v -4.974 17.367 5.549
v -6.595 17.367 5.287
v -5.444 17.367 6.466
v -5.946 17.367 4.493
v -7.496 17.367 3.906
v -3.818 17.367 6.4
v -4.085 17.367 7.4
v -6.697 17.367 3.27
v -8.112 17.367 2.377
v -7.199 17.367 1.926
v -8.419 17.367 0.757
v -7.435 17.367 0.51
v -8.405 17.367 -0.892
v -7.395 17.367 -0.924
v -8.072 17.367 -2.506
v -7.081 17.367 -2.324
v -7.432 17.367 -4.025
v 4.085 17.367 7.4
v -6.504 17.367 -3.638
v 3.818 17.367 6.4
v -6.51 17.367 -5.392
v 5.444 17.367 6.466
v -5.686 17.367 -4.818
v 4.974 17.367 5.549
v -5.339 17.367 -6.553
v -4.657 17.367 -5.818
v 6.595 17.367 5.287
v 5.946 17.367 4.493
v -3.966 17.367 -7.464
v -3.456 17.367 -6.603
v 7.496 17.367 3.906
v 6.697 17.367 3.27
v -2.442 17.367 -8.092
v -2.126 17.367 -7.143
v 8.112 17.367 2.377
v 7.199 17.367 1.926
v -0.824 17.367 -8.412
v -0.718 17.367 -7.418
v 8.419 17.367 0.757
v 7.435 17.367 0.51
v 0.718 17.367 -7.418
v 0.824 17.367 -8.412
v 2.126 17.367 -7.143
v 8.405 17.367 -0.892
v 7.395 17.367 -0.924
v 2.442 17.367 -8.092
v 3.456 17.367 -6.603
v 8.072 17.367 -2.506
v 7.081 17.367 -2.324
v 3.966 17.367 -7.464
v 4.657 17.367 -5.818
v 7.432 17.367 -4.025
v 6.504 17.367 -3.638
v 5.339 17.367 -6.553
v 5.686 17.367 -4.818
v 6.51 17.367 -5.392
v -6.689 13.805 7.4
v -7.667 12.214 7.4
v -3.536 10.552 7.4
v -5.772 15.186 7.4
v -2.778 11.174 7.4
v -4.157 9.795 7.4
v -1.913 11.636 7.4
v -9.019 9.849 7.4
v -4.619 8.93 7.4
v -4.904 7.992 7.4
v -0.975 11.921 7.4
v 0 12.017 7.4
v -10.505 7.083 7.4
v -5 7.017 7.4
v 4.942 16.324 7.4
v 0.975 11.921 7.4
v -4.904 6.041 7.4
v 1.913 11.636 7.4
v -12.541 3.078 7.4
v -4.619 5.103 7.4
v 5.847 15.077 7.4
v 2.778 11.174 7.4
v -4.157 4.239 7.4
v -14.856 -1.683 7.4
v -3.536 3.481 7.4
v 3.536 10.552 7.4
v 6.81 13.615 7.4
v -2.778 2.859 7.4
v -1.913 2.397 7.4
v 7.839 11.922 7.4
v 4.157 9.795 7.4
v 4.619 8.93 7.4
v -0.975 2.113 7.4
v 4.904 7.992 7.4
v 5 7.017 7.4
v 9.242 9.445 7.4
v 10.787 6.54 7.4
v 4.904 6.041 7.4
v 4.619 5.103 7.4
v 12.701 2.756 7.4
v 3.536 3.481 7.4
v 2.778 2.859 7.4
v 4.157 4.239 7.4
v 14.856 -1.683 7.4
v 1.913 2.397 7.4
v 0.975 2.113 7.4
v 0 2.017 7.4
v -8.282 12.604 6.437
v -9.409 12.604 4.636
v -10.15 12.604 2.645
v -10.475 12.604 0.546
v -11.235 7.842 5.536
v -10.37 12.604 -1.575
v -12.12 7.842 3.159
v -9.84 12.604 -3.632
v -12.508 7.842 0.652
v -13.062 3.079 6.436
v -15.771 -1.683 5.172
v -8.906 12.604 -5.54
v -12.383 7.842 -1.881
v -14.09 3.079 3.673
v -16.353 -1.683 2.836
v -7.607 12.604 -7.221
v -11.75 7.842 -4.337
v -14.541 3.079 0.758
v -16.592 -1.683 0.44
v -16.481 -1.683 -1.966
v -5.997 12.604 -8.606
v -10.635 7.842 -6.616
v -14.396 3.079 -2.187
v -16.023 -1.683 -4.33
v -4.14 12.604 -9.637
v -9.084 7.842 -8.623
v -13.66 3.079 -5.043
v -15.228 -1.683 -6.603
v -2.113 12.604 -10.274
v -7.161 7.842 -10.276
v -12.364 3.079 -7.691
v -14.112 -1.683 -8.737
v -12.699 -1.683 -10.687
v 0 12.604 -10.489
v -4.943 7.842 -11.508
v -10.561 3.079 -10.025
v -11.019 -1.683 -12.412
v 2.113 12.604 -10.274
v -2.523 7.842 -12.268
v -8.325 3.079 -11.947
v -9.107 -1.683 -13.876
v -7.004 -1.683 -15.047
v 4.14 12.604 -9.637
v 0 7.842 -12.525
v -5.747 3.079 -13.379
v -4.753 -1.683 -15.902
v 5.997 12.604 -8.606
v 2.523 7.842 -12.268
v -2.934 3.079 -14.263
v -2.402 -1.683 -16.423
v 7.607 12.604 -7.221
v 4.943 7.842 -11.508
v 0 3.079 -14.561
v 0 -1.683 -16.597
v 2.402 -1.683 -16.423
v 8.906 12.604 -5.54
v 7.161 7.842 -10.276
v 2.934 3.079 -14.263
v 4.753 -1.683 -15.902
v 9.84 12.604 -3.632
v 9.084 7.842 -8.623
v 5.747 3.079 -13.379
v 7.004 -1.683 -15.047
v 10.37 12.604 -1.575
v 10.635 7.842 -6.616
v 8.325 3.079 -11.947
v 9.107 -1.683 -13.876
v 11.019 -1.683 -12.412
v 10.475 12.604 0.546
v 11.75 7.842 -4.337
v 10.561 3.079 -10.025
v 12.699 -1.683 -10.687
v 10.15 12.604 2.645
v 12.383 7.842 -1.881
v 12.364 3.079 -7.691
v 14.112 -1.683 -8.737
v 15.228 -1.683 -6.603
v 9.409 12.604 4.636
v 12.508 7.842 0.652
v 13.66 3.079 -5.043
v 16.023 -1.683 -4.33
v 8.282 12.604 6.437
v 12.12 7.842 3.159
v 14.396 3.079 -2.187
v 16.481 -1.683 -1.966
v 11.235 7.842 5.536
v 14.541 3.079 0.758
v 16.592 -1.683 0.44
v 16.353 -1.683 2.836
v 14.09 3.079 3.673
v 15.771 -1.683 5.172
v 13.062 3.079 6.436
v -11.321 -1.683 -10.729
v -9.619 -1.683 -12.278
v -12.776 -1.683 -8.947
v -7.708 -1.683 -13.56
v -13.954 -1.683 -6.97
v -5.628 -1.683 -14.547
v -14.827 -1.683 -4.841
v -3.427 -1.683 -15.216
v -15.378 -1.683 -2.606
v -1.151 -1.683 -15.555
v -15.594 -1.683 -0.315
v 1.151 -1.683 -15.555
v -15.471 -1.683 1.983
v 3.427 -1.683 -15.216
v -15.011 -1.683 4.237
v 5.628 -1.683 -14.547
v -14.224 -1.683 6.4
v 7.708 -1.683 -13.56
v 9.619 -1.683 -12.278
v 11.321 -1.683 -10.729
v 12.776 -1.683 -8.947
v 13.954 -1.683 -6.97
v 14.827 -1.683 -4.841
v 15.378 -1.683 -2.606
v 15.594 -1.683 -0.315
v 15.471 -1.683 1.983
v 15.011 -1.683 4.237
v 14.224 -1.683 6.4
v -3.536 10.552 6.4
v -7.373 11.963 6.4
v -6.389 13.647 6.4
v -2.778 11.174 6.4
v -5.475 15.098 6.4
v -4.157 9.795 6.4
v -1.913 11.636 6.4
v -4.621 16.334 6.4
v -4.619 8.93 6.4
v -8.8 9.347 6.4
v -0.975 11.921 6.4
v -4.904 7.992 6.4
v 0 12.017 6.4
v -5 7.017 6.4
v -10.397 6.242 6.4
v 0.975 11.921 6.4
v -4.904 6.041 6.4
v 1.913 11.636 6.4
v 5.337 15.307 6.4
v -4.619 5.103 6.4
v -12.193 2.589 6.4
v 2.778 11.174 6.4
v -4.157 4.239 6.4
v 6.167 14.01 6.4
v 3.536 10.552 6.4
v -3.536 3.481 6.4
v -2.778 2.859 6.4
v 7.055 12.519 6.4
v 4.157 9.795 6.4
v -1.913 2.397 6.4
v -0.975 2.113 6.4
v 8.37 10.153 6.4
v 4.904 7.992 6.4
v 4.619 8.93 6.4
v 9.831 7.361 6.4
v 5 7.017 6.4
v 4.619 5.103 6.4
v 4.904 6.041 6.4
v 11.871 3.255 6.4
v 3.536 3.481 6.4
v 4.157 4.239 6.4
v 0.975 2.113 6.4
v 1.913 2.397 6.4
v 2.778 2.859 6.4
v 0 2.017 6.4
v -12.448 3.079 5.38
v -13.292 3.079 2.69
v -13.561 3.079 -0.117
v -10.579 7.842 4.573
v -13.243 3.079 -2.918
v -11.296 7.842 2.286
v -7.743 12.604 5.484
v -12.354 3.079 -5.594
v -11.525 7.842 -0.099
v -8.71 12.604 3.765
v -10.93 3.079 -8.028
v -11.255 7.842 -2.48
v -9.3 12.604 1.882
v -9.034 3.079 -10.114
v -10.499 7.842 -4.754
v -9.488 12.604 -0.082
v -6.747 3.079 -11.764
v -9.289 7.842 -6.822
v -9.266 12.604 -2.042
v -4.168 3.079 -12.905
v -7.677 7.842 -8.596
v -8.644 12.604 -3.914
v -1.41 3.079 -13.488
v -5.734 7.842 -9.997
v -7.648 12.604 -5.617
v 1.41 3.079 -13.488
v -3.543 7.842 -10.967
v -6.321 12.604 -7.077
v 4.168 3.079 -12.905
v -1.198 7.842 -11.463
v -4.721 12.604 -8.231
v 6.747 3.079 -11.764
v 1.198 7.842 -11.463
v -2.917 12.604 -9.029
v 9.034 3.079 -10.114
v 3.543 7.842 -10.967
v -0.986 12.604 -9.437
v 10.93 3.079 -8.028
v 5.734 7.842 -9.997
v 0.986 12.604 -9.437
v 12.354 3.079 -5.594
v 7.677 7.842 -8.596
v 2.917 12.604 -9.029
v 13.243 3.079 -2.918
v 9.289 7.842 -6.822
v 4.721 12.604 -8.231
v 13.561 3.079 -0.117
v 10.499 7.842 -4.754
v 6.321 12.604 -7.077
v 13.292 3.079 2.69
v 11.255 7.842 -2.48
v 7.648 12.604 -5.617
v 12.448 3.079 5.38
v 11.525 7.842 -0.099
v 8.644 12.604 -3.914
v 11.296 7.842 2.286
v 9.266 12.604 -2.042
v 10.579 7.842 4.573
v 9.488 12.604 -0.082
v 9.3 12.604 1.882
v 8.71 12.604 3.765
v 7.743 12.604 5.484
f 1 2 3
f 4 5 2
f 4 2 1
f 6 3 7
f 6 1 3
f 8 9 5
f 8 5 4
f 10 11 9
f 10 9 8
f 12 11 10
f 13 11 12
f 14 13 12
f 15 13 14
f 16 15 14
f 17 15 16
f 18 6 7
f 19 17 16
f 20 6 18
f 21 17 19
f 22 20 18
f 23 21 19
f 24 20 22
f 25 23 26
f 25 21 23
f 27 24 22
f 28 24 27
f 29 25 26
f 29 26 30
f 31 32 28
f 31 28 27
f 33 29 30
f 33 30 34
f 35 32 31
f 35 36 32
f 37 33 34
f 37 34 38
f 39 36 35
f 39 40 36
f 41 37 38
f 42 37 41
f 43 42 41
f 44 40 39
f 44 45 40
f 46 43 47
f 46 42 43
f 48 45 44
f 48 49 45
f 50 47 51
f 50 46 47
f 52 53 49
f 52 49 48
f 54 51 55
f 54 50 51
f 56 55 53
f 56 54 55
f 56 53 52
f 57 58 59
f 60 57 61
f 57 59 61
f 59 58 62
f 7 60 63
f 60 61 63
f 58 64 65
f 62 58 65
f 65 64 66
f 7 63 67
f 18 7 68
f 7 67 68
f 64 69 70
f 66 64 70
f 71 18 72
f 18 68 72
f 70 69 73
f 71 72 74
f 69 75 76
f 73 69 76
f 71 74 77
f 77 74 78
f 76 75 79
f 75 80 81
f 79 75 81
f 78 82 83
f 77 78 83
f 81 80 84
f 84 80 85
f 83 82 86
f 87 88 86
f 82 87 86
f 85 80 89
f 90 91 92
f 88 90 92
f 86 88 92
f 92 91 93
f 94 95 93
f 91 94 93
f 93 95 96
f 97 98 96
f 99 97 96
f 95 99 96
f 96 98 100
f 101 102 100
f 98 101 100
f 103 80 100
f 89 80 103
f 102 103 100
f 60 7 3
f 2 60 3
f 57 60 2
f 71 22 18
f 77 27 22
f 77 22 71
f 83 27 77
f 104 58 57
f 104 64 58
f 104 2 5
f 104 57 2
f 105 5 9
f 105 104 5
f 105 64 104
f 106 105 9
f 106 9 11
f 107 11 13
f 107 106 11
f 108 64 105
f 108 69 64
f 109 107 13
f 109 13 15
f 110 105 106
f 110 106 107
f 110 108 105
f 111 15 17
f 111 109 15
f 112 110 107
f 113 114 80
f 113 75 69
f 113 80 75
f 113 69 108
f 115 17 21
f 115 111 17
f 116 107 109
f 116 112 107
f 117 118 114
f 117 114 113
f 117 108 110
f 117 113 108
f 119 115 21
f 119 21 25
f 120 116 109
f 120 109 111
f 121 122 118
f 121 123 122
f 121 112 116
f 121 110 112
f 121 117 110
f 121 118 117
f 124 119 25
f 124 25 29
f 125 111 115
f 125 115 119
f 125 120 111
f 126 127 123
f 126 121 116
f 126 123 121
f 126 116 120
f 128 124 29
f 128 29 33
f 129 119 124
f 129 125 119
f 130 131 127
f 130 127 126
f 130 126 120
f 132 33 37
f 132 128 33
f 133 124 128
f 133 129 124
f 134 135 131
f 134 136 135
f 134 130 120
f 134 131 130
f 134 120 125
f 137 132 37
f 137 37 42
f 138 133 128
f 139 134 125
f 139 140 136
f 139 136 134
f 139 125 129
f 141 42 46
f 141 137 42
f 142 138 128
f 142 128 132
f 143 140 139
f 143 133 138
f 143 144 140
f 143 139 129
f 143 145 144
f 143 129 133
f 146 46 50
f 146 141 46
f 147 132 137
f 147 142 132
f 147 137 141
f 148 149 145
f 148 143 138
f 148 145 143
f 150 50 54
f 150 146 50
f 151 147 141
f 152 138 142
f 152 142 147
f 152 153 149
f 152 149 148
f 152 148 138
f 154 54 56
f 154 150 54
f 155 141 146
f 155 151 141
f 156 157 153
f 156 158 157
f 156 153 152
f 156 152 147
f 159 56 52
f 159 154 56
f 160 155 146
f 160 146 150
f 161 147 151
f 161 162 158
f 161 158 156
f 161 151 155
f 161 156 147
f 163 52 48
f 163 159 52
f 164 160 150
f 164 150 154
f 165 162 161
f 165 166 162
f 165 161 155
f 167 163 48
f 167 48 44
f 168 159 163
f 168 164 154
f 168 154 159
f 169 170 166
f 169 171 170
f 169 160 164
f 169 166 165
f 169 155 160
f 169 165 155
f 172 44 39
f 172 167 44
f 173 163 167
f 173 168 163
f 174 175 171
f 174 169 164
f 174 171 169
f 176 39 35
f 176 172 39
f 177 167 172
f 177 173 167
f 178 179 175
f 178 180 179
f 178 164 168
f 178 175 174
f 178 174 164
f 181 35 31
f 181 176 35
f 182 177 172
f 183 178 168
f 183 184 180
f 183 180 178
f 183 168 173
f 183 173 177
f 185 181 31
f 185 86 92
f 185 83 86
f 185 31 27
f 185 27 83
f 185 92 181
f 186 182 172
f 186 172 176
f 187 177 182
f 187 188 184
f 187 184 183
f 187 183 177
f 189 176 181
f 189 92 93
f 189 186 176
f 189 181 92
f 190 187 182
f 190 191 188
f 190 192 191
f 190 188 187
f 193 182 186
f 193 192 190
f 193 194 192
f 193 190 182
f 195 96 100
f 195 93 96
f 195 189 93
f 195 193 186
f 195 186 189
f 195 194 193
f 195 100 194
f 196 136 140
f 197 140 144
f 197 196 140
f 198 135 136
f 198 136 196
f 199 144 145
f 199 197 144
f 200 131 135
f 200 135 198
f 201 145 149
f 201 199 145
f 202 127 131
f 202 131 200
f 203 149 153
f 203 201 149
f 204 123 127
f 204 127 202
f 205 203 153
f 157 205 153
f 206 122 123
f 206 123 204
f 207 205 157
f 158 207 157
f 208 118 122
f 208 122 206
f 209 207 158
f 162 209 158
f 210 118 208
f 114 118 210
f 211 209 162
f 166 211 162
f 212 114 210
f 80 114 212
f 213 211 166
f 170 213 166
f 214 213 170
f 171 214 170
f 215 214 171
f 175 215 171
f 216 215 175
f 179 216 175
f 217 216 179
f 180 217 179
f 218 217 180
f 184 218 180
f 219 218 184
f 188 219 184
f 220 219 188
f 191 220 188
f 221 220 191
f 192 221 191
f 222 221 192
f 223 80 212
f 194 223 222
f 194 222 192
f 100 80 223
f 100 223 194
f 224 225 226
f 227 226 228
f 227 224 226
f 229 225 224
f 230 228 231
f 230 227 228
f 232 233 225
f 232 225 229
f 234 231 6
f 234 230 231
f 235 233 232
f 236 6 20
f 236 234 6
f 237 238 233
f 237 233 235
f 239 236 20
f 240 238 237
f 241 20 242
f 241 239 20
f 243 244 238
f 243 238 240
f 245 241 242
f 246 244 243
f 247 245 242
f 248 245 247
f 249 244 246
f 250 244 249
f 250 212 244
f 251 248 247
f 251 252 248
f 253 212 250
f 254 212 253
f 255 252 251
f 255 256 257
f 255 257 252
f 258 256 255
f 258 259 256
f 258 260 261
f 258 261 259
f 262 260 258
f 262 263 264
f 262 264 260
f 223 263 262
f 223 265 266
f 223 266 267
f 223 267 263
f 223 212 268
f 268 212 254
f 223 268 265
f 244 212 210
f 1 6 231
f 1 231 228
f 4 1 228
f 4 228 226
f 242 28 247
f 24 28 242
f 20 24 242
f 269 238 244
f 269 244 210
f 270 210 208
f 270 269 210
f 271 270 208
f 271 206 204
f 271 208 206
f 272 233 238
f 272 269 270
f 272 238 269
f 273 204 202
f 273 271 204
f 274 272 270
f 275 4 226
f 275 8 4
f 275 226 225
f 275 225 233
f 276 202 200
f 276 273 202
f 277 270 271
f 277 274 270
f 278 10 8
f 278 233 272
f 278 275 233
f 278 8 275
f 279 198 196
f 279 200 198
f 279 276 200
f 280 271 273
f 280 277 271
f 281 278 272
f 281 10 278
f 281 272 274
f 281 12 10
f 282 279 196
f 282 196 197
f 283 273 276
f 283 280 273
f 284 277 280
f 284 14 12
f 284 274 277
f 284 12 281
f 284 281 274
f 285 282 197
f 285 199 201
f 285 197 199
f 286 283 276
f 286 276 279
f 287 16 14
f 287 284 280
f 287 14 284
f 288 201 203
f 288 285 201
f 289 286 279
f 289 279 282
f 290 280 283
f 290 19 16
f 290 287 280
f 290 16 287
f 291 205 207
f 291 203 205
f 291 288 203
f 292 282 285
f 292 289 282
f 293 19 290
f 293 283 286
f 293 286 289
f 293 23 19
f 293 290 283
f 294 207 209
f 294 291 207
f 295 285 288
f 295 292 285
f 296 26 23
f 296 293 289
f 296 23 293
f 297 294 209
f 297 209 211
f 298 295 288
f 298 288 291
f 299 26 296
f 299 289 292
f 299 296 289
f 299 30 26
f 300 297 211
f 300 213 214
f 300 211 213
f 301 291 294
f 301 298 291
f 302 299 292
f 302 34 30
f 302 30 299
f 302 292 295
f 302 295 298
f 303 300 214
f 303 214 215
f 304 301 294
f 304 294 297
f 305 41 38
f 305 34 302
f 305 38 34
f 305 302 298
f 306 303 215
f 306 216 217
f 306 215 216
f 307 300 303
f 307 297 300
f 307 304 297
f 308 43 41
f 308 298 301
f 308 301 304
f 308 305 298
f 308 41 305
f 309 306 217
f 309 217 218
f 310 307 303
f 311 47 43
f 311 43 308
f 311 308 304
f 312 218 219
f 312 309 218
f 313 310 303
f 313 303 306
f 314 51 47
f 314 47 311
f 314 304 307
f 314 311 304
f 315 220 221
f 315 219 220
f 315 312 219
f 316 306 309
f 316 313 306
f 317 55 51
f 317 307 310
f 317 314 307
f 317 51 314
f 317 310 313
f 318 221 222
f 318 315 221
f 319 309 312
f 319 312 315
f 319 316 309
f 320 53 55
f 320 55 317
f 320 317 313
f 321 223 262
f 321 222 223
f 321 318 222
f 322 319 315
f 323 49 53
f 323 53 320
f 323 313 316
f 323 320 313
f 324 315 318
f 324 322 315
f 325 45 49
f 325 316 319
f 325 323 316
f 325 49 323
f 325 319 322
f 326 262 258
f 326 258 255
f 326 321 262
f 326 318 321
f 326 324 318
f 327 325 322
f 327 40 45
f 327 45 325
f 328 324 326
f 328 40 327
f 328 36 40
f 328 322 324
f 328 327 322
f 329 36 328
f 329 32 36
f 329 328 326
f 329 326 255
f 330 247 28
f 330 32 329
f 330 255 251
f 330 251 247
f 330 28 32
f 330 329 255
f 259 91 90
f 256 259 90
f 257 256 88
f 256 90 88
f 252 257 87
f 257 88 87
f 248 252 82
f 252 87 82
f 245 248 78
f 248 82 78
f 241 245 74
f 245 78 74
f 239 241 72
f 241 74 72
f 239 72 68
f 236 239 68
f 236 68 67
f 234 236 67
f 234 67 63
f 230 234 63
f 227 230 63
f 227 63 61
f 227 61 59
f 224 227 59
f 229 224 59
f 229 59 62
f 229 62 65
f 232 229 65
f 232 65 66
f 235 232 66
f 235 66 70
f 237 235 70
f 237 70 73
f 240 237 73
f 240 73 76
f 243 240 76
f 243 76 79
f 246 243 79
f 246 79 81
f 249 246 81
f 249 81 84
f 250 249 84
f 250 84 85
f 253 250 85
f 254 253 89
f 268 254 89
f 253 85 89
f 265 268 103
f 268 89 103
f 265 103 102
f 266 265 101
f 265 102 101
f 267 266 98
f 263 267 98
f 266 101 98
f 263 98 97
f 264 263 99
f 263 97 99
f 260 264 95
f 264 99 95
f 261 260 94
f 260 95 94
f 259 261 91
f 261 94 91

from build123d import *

# Parameters (mm, degrees)
CUT_EXTRUDE1_DEPTH      = 32.981303132
CUT_EXTRUDE1_DEPTH_BACK = 32.981303132
SKETCH4_W               = 44.770884432
SKETCH4_H               = 10.69042287
SKETCH6_W               = 30.665330586
SKETCH6_H               = 1
BOSS_EXTRUDE1_DEPTH     = 21.05
SKETCH8_W               = 44.013591964
SKETCH8_H               = 26.255140404
CUT_EXTRUDE2_DEPTH      = 1
SKETCH9_W               = 50.816359418
SKETCH9_H               = 30.548951937
CUT_EXTRUDE3_DEPTH      = 1
CUT_EXTRUDE4_REACH      = 35.955
SKETCH10_R              = 5


with BuildPart() as part:
    # Sketch3 → Revolve1 (revolve)
    with BuildSketch(Plane.XY):
        Polygon((-7.025, 18.366712654), (-8.025, 18.366712654), (-17.025, -2.683287346), (-16.025, -2.683287346), align=None)
    revolve(axis=Axis((0, 50, 0), (0, -1, 0)))

    # Sketch4 → Cut-Extrude1 (cut, two sides: drawn at the far end of the back side and taken through both)
    with BuildSketch(Plane(origin=(0, 18.366712654, 0), x_dir=(1, 0, 0), z_dir=(0, 1, 0)).offset(-CUT_EXTRUDE1_DEPTH_BACK)):
        with Locations((0.720276718, -12.745211435)):
            Rectangle(SKETCH4_W, SKETCH4_H)
    extrude(amount=CUT_EXTRUDE1_DEPTH + CUT_EXTRUDE1_DEPTH_BACK, mode=Mode.SUBTRACT)

    # Sketch6 → Boss-Extrude1 (add)
    with BuildSketch(Plane.XZ.offset(2.683287346)):
        with Locations((0, 6.9)):
            Rectangle(SKETCH6_W, SKETCH6_H)
    extrude(amount=-BOSS_EXTRUDE1_DEPTH)

    # Sketch7 → Cut-Revolve1 (revolve, cut)
    with BuildSketch(Plane(origin=(0, 0, 0), x_dir=(0, 0, -1), z_dir=(1, 0, 0))):
        Polygon((8.025, 18.366712654), (17.025, -2.683287346), (18.600289965, -2.683287346), (18.600289965, 18.366712654), align=None)
    revolve(axis=Axis((0, 14.930838331, 0), (0, -1, 0)), mode=Mode.SUBTRACT)

    # Sketch8 → Cut-Extrude2 (cut)
    with BuildSketch(Plane(origin=(0, 18.366712654, 0), x_dir=(1, 0, 0), z_dir=(0, 1, 0))):
        with Locations((-2.588663139, 4.329260992)):
            Rectangle(SKETCH8_W, SKETCH8_H)
    extrude(amount=-CUT_EXTRUDE2_DEPTH, mode=Mode.SUBTRACT)

    # Sketch9 → Cut-Extrude3 (cut)
    with BuildSketch(Plane.XZ.offset(2.683287346)):
        with Locations((0.819476292, -3.706436551)):
            Rectangle(SKETCH9_W, SKETCH9_H)
    extrude(amount=-CUT_EXTRUDE3_DEPTH, mode=Mode.SUBTRACT)

    # Sketch10 → Cut-Extrude4 (cut, up to next)
    with BuildSketch(Plane.XY.offset(7.4), mode=Mode.PRIVATE) as cut_extrude4_sk1:
        with Locations((0, 7.016712654)):
            Circle(SKETCH10_R)
    cut_extrude4_tool1 = extrude(cut_extrude4_sk1.sketch, amount=-CUT_EXTRUDE4_REACH, mode=Mode.PRIVATE) & part.part
    add(cut_extrude4_tool1.solids().sort_by_distance((0, 7.016713, 7.4))[0], mode=Mode.SUBTRACT)


solid = part.part
